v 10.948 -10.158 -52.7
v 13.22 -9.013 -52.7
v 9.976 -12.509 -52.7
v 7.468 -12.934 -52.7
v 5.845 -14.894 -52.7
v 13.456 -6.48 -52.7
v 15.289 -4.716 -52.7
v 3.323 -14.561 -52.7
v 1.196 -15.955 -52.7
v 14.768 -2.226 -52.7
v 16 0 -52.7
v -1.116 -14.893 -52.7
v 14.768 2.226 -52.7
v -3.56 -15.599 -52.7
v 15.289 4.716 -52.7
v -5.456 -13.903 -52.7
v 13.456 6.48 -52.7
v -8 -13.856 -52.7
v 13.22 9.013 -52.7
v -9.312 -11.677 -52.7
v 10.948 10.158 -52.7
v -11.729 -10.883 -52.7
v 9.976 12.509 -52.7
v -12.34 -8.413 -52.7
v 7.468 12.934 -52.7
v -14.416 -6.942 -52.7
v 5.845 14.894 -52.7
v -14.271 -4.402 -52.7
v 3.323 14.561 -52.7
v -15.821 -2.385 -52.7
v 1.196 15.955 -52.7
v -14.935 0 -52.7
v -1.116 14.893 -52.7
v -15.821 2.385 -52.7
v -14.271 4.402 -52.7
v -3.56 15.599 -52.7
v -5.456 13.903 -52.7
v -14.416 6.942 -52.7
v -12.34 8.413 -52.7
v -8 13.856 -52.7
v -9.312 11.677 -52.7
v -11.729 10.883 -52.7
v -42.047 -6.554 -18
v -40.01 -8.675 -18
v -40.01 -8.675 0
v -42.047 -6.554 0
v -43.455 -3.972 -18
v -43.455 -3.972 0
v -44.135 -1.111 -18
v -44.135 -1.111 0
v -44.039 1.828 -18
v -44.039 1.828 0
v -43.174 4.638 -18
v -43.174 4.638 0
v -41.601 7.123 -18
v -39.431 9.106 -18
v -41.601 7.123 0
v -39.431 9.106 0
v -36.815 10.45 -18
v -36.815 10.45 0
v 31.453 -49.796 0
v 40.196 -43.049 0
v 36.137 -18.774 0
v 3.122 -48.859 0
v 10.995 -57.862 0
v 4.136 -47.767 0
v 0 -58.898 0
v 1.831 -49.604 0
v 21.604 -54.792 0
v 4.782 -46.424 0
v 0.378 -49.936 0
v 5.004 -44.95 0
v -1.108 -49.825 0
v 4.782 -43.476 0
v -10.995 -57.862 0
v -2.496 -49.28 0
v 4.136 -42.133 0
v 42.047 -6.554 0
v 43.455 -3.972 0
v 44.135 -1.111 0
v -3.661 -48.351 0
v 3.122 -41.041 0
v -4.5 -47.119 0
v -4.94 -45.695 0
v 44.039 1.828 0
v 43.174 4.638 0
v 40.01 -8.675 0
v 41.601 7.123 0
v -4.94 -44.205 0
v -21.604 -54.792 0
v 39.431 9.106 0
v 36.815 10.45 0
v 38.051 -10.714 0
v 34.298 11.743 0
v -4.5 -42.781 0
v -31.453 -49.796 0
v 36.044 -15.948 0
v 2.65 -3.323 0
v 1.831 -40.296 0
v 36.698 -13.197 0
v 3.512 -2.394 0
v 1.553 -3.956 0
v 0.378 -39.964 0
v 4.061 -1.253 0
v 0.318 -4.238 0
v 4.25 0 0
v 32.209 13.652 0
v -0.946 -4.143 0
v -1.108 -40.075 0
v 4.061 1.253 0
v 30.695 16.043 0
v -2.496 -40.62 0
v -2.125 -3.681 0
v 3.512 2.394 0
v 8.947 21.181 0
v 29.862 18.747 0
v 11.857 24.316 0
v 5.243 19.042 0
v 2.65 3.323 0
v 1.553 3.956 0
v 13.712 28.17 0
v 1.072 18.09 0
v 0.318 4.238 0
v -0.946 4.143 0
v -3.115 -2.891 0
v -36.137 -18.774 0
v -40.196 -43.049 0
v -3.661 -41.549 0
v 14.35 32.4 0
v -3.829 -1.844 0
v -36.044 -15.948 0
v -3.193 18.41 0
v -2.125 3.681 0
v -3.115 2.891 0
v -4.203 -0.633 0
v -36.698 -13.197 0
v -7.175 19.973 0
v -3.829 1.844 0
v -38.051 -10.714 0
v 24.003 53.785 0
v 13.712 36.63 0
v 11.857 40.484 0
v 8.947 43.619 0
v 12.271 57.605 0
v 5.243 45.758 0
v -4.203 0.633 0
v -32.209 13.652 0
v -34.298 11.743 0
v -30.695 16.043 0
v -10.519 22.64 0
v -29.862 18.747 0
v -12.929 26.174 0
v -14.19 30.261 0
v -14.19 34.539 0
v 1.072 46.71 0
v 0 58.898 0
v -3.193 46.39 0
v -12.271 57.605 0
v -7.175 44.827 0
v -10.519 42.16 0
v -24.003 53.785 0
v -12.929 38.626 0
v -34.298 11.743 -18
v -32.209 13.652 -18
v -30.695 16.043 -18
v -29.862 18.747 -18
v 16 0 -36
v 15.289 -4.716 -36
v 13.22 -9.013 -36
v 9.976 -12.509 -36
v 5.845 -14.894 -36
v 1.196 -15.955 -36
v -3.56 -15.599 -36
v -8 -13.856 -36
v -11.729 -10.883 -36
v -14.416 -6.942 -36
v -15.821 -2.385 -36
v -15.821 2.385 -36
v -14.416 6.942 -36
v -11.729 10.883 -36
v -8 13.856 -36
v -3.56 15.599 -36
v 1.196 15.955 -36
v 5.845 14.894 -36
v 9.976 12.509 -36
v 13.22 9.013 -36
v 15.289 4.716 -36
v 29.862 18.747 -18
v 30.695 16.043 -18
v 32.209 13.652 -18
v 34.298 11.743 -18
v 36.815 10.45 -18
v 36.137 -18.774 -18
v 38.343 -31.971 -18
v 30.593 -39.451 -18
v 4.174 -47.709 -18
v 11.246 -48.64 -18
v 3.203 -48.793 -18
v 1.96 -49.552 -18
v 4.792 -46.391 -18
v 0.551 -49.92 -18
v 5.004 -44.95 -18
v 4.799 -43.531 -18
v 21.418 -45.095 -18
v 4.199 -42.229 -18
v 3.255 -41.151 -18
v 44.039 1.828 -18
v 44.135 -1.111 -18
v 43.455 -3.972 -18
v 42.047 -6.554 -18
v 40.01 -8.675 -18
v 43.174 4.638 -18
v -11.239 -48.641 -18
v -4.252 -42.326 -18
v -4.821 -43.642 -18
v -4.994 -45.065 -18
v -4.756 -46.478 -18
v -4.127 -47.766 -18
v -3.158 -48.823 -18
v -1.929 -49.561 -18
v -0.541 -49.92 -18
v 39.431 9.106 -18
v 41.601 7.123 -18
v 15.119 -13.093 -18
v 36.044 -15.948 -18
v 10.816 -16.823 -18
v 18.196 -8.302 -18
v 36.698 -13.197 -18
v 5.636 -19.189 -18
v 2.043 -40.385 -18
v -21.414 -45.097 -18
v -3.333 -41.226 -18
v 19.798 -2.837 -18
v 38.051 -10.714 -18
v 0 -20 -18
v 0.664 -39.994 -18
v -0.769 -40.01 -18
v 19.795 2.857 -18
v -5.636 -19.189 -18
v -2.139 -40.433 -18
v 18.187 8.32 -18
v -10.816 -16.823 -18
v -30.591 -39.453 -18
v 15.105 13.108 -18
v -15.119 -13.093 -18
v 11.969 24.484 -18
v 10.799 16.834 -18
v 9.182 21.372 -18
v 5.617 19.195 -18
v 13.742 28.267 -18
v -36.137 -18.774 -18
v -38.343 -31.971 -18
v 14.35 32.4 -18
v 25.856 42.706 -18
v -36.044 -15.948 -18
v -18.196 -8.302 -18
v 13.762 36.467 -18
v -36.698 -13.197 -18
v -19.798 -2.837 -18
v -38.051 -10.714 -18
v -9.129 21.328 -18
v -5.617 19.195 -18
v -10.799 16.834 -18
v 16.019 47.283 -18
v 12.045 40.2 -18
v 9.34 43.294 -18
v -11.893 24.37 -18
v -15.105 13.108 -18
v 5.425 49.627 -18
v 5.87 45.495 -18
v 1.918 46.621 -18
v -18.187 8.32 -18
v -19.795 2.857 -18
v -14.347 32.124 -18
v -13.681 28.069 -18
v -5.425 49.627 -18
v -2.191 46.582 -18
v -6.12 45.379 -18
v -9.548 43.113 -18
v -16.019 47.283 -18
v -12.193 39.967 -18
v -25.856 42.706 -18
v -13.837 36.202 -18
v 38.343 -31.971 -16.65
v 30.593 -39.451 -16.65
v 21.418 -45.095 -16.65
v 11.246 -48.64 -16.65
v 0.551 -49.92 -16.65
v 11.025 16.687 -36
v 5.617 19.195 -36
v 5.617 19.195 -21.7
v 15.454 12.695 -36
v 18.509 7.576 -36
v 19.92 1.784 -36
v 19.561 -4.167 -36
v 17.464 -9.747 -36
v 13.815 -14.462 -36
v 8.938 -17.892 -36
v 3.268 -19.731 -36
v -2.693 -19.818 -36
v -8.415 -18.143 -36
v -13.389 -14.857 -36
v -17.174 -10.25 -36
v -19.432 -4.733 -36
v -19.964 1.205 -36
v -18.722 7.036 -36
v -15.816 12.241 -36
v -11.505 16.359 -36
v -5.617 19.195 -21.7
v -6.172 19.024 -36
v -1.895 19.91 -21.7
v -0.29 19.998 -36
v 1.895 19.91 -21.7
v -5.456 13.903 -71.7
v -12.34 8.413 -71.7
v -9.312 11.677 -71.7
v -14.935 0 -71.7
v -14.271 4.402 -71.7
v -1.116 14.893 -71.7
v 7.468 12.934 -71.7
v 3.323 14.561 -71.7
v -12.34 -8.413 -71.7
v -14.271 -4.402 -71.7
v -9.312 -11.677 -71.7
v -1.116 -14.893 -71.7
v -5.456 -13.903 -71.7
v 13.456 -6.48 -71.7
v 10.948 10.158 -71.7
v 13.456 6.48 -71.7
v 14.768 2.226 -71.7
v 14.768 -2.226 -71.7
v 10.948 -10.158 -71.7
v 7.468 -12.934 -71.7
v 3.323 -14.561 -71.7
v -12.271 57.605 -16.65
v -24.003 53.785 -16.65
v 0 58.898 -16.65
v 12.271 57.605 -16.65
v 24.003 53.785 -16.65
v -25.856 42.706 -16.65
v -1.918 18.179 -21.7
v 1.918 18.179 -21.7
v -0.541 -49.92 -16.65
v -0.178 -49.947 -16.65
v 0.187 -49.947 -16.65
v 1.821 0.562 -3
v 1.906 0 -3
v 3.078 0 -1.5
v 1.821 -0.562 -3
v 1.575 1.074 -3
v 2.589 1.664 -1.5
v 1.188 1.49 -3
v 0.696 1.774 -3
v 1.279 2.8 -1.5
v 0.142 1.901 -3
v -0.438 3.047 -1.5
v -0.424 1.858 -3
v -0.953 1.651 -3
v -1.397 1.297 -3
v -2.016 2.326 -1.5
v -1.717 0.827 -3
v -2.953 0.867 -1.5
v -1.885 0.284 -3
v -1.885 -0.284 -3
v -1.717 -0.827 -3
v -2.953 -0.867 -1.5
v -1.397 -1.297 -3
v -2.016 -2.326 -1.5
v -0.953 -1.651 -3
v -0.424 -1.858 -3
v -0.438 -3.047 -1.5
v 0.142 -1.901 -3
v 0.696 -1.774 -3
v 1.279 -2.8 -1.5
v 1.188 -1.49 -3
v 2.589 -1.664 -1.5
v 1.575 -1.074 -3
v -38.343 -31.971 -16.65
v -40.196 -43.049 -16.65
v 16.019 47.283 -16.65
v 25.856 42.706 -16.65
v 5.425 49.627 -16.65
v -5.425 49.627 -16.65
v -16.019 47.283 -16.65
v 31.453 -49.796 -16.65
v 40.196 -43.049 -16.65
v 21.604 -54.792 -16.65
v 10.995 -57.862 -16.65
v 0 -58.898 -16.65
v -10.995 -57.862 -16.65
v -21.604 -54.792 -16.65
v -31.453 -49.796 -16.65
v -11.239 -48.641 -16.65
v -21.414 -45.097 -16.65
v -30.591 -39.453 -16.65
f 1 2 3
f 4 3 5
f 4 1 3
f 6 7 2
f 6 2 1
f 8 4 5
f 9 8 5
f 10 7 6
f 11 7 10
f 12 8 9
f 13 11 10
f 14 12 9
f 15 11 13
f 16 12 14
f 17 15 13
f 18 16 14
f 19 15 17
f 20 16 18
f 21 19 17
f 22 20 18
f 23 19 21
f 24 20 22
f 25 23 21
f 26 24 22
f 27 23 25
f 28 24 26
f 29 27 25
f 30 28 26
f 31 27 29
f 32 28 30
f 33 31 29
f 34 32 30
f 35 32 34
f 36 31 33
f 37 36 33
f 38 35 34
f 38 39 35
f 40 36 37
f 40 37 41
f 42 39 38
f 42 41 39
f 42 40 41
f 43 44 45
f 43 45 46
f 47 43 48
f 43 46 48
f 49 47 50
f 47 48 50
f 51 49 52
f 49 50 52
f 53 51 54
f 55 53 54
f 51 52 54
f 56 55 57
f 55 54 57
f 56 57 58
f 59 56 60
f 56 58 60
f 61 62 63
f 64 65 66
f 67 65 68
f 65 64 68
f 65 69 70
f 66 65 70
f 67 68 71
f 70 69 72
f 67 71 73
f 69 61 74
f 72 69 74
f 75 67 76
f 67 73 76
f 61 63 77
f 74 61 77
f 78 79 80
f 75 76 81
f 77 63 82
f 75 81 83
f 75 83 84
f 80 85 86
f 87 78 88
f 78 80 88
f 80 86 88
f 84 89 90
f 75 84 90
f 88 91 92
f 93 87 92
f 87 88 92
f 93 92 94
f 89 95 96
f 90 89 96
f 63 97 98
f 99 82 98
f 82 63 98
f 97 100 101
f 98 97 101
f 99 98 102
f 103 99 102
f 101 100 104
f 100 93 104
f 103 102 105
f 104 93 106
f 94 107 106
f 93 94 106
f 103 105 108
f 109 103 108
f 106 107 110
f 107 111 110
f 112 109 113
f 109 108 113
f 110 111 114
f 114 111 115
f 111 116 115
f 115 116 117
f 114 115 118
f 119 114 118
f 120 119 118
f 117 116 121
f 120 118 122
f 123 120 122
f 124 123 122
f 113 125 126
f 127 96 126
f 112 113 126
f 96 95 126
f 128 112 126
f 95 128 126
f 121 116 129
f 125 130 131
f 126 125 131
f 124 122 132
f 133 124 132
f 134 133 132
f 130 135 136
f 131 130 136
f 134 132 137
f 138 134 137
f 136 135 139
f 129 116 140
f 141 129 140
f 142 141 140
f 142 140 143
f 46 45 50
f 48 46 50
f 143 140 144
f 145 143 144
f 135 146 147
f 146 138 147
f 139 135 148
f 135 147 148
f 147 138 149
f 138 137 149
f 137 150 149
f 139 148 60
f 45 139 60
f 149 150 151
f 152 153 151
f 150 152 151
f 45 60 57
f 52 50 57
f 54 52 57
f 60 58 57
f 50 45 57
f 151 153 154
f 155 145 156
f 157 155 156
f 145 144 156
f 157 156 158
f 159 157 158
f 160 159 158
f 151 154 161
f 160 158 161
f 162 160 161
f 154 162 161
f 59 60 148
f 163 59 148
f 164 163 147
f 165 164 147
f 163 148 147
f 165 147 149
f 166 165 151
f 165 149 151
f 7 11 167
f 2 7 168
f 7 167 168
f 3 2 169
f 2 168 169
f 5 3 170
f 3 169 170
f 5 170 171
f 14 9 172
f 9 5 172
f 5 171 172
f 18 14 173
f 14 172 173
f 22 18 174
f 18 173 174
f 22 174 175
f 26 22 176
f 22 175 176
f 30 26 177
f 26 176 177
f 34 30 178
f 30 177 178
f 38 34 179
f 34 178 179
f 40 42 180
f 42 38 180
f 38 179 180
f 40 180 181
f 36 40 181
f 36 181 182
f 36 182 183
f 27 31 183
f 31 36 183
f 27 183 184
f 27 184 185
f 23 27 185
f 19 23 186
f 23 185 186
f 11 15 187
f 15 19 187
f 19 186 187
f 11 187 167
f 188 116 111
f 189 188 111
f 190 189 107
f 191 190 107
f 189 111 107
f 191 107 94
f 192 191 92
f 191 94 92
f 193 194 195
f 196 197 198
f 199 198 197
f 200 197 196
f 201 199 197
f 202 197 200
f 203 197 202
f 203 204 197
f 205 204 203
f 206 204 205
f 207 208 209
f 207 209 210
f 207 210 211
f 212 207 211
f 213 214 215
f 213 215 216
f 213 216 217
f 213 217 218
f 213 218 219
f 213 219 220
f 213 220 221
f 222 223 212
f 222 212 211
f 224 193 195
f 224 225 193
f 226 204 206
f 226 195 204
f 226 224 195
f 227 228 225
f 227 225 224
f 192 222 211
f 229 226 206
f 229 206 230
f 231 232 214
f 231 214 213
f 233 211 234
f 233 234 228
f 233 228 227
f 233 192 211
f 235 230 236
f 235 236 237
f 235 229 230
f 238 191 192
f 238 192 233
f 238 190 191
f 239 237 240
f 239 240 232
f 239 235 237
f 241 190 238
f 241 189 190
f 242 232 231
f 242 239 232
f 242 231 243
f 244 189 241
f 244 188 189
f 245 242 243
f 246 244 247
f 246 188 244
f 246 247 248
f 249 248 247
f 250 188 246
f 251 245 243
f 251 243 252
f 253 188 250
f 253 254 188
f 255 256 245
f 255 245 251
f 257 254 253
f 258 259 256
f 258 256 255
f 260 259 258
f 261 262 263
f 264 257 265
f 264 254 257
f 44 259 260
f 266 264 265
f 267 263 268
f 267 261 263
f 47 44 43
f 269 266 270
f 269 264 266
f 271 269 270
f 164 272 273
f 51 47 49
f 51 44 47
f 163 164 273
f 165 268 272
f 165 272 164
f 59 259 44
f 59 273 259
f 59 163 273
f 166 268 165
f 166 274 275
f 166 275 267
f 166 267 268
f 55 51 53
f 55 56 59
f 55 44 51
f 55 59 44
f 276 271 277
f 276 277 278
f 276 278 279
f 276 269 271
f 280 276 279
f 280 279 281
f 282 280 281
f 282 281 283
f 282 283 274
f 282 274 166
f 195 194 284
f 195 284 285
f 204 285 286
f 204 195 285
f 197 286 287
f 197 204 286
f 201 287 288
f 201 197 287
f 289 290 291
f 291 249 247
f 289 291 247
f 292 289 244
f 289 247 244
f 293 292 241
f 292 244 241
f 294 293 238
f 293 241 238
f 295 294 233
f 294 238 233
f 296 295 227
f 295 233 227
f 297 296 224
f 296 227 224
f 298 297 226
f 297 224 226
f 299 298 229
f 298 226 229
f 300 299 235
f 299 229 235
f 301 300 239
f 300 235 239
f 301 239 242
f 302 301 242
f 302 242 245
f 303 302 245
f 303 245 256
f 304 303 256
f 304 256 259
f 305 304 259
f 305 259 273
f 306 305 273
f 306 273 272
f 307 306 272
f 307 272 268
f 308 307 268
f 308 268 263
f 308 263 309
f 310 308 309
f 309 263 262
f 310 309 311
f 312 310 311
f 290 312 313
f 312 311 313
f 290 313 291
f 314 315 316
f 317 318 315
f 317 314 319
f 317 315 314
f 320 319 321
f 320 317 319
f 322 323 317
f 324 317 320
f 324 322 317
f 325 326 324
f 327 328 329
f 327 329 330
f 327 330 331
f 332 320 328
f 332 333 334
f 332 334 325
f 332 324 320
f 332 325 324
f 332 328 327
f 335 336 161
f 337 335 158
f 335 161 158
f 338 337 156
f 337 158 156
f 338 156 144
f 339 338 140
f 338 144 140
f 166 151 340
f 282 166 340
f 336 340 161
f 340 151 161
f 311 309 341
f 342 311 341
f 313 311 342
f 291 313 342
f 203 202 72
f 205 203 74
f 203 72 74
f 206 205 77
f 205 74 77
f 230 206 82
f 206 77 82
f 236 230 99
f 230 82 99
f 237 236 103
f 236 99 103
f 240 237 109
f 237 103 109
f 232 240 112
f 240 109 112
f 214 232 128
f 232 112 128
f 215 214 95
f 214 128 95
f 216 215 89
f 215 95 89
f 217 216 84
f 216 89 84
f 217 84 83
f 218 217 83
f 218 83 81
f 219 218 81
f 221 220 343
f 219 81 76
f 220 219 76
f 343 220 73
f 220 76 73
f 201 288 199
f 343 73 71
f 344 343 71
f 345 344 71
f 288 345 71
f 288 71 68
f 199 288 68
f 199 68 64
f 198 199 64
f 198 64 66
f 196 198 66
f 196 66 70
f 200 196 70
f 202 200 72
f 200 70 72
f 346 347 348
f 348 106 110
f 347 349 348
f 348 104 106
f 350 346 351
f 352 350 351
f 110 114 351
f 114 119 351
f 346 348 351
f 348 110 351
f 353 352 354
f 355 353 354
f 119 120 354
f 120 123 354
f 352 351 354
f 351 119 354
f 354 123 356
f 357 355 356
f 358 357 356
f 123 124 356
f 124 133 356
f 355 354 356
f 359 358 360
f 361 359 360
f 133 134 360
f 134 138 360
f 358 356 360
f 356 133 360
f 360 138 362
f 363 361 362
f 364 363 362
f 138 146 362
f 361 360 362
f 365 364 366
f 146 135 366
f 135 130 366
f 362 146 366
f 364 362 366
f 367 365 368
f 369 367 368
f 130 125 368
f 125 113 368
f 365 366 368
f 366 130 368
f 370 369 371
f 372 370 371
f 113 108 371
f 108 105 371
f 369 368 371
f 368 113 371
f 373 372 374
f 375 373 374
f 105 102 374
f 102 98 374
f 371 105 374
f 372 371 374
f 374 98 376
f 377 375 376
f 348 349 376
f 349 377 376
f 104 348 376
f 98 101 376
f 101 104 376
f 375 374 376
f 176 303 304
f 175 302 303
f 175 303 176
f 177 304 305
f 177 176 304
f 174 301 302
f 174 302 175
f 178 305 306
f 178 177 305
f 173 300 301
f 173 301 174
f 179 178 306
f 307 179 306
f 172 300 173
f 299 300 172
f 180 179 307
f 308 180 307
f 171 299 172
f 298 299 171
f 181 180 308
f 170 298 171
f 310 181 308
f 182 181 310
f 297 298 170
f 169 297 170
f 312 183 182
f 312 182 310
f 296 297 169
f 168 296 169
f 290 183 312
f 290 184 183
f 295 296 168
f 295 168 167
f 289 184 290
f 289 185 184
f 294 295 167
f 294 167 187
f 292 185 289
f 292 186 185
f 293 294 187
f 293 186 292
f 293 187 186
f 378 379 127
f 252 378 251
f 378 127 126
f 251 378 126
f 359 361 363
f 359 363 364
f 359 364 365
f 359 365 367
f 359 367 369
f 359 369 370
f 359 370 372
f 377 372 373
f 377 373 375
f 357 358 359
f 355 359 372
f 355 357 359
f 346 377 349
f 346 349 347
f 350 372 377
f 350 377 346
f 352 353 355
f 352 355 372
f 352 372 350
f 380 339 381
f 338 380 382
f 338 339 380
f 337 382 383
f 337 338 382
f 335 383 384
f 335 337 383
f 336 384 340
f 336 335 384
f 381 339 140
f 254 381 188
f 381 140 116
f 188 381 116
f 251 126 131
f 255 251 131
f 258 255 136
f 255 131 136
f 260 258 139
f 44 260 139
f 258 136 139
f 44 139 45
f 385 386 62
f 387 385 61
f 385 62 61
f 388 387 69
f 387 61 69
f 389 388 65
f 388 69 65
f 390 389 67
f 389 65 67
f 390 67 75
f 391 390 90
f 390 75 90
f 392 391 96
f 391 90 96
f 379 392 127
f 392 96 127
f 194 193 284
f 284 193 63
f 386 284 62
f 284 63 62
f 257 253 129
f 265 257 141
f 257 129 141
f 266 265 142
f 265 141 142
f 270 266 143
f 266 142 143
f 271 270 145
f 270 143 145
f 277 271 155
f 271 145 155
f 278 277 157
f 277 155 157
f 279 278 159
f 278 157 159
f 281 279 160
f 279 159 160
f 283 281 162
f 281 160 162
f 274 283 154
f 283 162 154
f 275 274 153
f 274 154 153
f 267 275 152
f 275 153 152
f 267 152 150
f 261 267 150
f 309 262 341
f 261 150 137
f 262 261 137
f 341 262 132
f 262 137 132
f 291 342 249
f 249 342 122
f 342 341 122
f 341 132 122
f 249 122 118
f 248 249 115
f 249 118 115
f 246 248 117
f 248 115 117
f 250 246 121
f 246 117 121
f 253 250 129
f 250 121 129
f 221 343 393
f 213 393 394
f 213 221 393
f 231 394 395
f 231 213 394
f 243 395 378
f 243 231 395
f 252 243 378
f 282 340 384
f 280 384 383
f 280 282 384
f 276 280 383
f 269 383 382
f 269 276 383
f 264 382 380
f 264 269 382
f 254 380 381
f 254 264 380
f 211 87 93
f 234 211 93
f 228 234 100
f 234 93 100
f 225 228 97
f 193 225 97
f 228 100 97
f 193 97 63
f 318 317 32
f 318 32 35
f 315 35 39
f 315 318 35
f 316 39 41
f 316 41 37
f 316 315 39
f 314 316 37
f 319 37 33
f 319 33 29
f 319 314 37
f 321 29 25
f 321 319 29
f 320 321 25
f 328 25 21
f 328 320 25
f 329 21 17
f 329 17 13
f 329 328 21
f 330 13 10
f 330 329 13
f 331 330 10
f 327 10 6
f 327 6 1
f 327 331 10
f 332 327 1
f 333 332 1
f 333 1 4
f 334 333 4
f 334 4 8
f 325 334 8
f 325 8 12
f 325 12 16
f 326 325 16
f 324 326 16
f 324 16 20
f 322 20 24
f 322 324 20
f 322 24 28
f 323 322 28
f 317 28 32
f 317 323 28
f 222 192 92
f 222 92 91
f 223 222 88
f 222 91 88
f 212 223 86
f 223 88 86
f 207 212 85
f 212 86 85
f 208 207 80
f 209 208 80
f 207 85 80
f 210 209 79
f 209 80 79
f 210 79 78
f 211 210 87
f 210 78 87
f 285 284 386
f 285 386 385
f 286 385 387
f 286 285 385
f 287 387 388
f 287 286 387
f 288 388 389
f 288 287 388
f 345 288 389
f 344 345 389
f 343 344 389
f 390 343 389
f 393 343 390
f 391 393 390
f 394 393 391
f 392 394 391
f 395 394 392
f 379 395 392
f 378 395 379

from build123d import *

# Parameters (mm, degrees)
SKETCH1_R           = 14.35
SKETCH1_R_2         = 5
BOSS_EXTRUDE1_DEPTH = 18
SKETCH2_R           = 20
BOSS_EXTRUDE2_DEPTH = 18
SKETCH3_R           = 16
BOSS_EXTRUDE3_DEPTH = 35.7
SKETCH5_OUTSIDE_W   = 123.14
SKETCH5_OUTSIDE_H   = 152.554
SKETCH5_OUTSIDE_R   = 14.935
CUT_EXTRUDE1_DEPTH  = 19
SKETCH7_R           = 4.25
CUT_EXTRUDE3_DEPTH  = 3
CUT_EXTRUDE3_DRAFT  = -38
SKETCH9_OUTSIDE_W   = 123.14
SKETCH9_OUTSIDE_H   = 152.554
SKETCH9_OUTSIDE_R   = 49.923055682
CUT_EXTRUDE4_DEPTH  = 1.35
SKETCH6_R           = 14.35
CUT_EXTRUDE5_DEPTH  = 21.7


with BuildPart() as part:
    # Sketch1 → Boss-Extrude1 (new body)
    with BuildSketch(Plane.XY):
        with BuildLine():
            Line((36.136520686, -18.774478422), (40.195752281, -43.049171521))
            ThreePointArc((40.195752281, -43.049171521), (0, -58.897620241), (-40.195752281, -43.049171521))
            Line((-40.195752281, -43.049171521), (-36.136520686, -18.774478422))
            ThreePointArc((-36.136520686, -18.774478422), (-36.697665198, -13.197066935), (-40.010085223, -8.674868838))
            ThreePointArc((-40.010085223, -8.674868838), (-44.039037615, 1.827589449), (-36.814887741, 10.449987378))
            ThreePointArc((-36.814887741, 10.449987378), (-32.208677837, 13.651878045), (-29.862109135, 18.747257211))
            Line((-29.862109135, 18.747257211), (-24.003146652, 53.784557457))
            ThreePointArc((-24.003146652, 53.784557457), (0, 58.897620241), (24.003146652, 53.784557457))
            Line((24.003146652, 53.784557457), (29.862109135, 18.747257211))
            ThreePointArc((29.862109135, 18.747257211), (32.208677837, 13.651878045), (36.814887741, 10.449987378))
            ThreePointArc((36.814887741, 10.449987378), (44.039037615, 1.827589449), (40.010085223, -8.674868838))
            ThreePointArc((40.010085223, -8.674868838), (36.697665198, -13.197066935), (36.136520686, -18.774478422))
        make_face()
        with Locations((0, 32.4)):
            Circle(SKETCH1_R, mode=Mode.SUBTRACT)
        with Locations((0.004379967, -44.949999787)):
            Circle(SKETCH1_R_2, mode=Mode.SUBTRACT)
    extrude(amount=-BOSS_EXTRUDE1_DEPTH)

    # Sketch2 → Boss-Extrude2 (add)
    with BuildSketch(Plane(origin=(0, 0, -18), x_dir=(-1, 0, 0), z_dir=(0, 0, -1))):
        with Locations(Location((0, 0, 0), (0, 0, 106.311047481))):
            Circle(SKETCH2_R)
    extrude(amount=BOSS_EXTRUDE2_DEPTH)

    # Sketch3 → Boss-Extrude3 (add)
    with BuildSketch(Plane(origin=(0, 0, -36), x_dir=(-1, 0, 0), z_dir=(0, 0, -1))):
        with Locations(Location((0, 0, 0), (0, 0, 180))):
            Circle(SKETCH3_R)
    extrude(amount=BOSS_EXTRUDE3_DEPTH)

    # Sketch5 outside → Cut-Extrude1 (cut)
    with BuildSketch(Plane(origin=(0, 0, -71.7), x_dir=(-1, 0, 0), z_dir=(0, 0, -1))):
        Rectangle(SKETCH5_OUTSIDE_W, SKETCH5_OUTSIDE_H)
        Circle(SKETCH5_OUTSIDE_R, mode=Mode.SUBTRACT)
    extrude(amount=-CUT_EXTRUDE1_DEPTH, mode=Mode.SUBTRACT)


with BuildPart() as cut_extrude3_tool:
    # Sketch7 → Cut-Extrude3 (with draft: the straight prism first)
    with BuildSketch(Plane.XY):
        Circle(SKETCH7_R)
    extrude(amount=-CUT_EXTRUDE3_DEPTH)
    # Cut-Extrude3: the draft: its side faces are tilted about the plane it starts from
    cut_extrude3_sides = [cut_extrude3_tool.faces().sort_by_distance(p)[0] for p in [
        (-4.25, 0, -1.5),
    ]]
    draft(cut_extrude3_sides, Plane.XY, CUT_EXTRUDE3_DRAFT)


with BuildPart() as part_1:
    add(part.part)

    # Cut-Extrude3: cut by cut_extrude3_tool
    add(cut_extrude3_tool.part, mode=Mode.SUBTRACT)

    # Sketch9 outside → Cut-Extrude4 (cut)
    with BuildSketch(Plane(origin=(0, 0, -18), x_dir=(-1, 0, 0), z_dir=(0, 0, -1))):
        Rectangle(SKETCH9_OUTSIDE_W, SKETCH9_OUTSIDE_H)
        Circle(SKETCH9_OUTSIDE_R, mode=Mode.SUBTRACT)
    extrude(amount=-CUT_EXTRUDE4_DEPTH, mode=Mode.SUBTRACT)

    # Sketch6 → Cut-Extrude5 (cut)
    with BuildSketch(Plane.XY):
        with Locations((0, 32.4)):
            Circle(SKETCH6_R)
    extrude(amount=-CUT_EXTRUDE5_DEPTH, mode=Mode.SUBTRACT)


solid = part_1.part
